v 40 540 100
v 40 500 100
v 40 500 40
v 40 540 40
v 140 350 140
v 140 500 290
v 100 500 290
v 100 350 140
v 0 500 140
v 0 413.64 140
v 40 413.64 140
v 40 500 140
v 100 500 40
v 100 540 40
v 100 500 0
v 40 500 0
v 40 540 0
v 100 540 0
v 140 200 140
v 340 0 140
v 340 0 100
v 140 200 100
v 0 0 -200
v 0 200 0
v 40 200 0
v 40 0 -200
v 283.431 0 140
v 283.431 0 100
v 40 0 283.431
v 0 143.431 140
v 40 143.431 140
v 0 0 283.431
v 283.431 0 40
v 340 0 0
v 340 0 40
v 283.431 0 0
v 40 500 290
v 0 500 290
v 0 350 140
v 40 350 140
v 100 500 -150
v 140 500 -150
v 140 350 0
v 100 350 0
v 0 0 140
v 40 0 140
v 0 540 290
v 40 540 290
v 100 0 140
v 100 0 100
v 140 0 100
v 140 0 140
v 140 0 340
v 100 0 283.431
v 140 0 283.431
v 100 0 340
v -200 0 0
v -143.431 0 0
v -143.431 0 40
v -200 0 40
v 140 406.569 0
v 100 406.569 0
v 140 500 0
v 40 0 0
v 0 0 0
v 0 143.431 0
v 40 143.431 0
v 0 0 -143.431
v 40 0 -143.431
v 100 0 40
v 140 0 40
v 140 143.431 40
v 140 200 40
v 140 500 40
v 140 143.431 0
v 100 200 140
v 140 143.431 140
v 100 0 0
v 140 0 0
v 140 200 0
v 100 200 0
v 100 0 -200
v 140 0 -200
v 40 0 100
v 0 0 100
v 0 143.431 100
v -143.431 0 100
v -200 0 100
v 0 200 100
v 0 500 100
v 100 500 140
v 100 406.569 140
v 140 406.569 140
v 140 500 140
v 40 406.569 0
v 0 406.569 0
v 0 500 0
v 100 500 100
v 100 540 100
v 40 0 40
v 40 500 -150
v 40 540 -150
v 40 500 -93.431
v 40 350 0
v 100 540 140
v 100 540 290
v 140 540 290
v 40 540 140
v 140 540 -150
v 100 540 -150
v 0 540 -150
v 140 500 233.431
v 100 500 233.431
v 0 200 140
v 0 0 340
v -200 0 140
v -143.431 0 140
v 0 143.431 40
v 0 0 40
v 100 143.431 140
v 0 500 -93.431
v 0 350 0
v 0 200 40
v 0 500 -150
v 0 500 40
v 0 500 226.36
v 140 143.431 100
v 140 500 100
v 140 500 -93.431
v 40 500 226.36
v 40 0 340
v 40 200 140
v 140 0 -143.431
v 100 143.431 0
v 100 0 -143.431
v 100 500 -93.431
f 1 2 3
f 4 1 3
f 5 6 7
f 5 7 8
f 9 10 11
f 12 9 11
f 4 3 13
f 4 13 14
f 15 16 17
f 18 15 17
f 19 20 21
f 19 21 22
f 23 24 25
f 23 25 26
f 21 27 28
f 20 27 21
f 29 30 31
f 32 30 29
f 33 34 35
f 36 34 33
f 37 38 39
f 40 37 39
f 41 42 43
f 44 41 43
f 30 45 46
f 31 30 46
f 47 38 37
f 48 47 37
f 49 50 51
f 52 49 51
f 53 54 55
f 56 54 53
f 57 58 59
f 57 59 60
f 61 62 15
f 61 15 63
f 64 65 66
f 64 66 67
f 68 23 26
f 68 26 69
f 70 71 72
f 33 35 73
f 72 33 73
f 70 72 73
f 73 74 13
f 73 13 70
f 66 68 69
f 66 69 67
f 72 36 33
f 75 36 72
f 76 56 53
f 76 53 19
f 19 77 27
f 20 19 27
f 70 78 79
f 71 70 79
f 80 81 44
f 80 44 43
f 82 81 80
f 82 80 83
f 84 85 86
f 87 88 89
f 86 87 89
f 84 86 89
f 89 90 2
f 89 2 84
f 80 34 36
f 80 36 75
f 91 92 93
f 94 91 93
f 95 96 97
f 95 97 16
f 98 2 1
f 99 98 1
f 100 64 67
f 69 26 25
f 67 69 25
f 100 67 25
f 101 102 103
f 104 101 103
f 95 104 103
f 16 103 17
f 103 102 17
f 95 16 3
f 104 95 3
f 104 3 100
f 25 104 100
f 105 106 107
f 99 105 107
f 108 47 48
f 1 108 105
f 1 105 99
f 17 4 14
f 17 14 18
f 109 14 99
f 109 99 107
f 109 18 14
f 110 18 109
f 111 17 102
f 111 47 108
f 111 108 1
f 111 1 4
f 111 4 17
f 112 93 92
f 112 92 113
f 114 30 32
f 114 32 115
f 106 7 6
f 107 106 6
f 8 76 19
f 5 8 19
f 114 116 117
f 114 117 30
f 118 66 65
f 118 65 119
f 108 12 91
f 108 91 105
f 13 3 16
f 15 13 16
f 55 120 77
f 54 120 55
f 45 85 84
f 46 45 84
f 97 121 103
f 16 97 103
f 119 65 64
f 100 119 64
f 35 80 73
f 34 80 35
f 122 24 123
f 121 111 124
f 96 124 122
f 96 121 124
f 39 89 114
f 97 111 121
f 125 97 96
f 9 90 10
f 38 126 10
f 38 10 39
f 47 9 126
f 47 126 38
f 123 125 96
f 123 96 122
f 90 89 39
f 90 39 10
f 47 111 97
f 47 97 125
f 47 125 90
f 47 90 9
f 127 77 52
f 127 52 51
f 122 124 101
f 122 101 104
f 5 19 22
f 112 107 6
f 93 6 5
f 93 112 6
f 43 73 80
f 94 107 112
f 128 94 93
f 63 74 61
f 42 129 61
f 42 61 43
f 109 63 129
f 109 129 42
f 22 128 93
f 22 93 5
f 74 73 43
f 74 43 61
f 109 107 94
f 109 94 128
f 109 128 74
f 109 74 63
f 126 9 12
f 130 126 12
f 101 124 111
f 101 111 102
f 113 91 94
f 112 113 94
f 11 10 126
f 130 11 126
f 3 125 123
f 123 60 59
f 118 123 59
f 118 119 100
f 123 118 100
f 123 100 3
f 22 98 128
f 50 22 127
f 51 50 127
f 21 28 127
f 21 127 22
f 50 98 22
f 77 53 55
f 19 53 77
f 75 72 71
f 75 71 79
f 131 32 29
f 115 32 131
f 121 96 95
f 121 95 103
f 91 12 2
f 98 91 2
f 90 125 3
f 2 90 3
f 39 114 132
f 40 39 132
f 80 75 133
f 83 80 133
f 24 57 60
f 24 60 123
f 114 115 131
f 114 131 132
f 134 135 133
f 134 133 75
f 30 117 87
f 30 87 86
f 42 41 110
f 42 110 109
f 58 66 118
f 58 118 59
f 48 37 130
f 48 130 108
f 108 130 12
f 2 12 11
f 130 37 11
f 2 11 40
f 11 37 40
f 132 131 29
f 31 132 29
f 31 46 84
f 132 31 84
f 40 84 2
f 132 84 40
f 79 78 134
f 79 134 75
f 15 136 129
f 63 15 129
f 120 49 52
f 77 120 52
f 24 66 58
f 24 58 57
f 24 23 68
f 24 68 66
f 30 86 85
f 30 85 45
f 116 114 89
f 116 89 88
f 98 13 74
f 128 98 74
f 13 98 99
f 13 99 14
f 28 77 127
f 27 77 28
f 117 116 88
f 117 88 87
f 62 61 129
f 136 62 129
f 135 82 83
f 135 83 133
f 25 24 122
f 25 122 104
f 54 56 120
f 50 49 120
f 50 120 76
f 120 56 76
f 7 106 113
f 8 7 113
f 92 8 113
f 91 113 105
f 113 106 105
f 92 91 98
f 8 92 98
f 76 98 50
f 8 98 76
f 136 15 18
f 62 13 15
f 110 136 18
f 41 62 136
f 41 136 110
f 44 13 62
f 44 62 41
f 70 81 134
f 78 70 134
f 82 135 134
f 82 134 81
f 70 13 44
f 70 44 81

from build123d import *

# Parameters (mm, degrees)
SKETCH_1_W             = 40
SKETCH_1_H             = 40
EXTRUDE_1_DEPTH        = 500
EXTRUDE_1_2_DEPTH      = 500
EXTRUDE_1_3_DEPTH      = 500
EXTRUDE_1_4_DEPTH      = 500
SKETCH_3_W             = 40
SKETCH_3_H             = 440
EXTRUDE_2_DEPTH        = 40
SKETCH_4_W             = 40
SKETCH_4_H             = 440
EXTRUDE_3_DEPTH        = 40
SKETCH_5_W             = 40
SKETCH_5_H             = 40
EXTRUDE_4_DEPTH        = 100
EXTRUDE_5_DEPTH        = 40
EXTRUDE_6_DEPTH        = 40
EXTRUDE_7_DEPTH        = 40
PATTERN_LINEAR_1_COUNT = 2
PATTERN_LINEAR_1_PITCH = 100
EXTRUDE_8_DEPTH        = 40
EXTRUDE_9_DEPTH        = 40


with BuildPart() as part:
    # 草图1 → 凸台-拉伸1 (new body)
    with BuildSketch(Plane(origin=(0, 0, 0), x_dir=(1, 0, 0), z_dir=(0, 1, 0))):
        with Locations((20, -20)):
            Rectangle(SKETCH_1_W, SKETCH_1_H)
    extrude(amount=EXTRUDE_1_DEPTH)



with BuildPart() as body_2:
    # 草图1 → Extrude 1 2 (new body)
    with BuildSketch(Plane(origin=(0, 0, 0), x_dir=(1, 0, 0), z_dir=(0, 1, 0))):
        with Locations((120, -20)):
            Rectangle(SKETCH_1_W, SKETCH_1_H)
    extrude(amount=EXTRUDE_1_2_DEPTH)



with BuildPart() as body_3:
    # 草图1 → Extrude 1 3 (new body)
    with BuildSketch(Plane(origin=(0, 0, 0), x_dir=(1, 0, 0), z_dir=(0, 1, 0))):
        with Locations((20, -120)):
            Rectangle(SKETCH_1_W, SKETCH_1_H)
    extrude(amount=EXTRUDE_1_3_DEPTH)


with BuildPart() as body_4:
    # 草图1 → Extrude 1 4 (new body)
    with BuildSketch(Plane(origin=(0, 0, 0), x_dir=(1, 0, 0), z_dir=(0, 1, 0))):
        with Locations((120, -120)):
            Rectangle(SKETCH_1_W, SKETCH_1_H)
    extrude(amount=EXTRUDE_1_4_DEPTH)


with BuildPart() as part_1:
    add(part.part)

    add(body_3.part)  # 凸台-拉伸2 merges body 3
    # 草图3 → 凸台-拉伸2 (add)
    with BuildSketch(Plane(origin=(0, 500, 0), x_dir=(1, 0, 0), z_dir=(0, 1, 0))):
        with Locations((20, -70)):
            Rectangle(SKETCH_3_W, SKETCH_3_H)
    extrude(amount=EXTRUDE_2_DEPTH)



with BuildPart() as body_2_1:
    add(body_2.part)

    add(body_4.part)  # 凸台-拉伸3 merges body 4
    # 草图4 → 凸台-拉伸3 (add)
    with BuildSketch(Plane(origin=(0, 500, 0), x_dir=(1, 0, 0), z_dir=(0, 1, 0))):
        with Locations((120, -70)):
            Rectangle(SKETCH_4_W, SKETCH_4_H)
    extrude(amount=EXTRUDE_3_DEPTH)


with BuildPart() as part_2:
    add(part_1.part)

    add(body_2_1.part)  # 凸台-拉伸4 merges body 2
    # 草图5 → 凸台-拉伸4 (add)
    with BuildSketch(Plane(origin=(40, 0, 0), x_dir=(0, 0, -1), z_dir=(1, 0, 0))):
        with Locations((-120, 520)):
            Rectangle(SKETCH_5_W, SKETCH_5_H)
        with Locations((-20, 520)):
            Rectangle(SKETCH_5_W, SKETCH_5_H)
    extrude(amount=EXTRUDE_4_DEPTH)

    # 草图6 → 凸台-拉伸5 (add)
    with BuildSketch(Plane(origin=(140, 0, 0), x_dir=(0, 0, -1), z_dir=(1, 0, 0))):
        Polygon((-290, 500), (-140, 350), (-140, 406.568542495), (-233.431457505, 500), align=None)
        Polygon((150, 500), (0, 350), (0, 406.568542495), (93.431457505, 500), align=None)
    extrude(amount=-EXTRUDE_5_DEPTH)

    # 草图7 → 凸台-拉伸6 (add)
    with BuildSketch(Plane.ZY):
        Polygon((-150, 500), (0, 350), (0, 406.568542495), (-93.431457505, 500), align=None)
        Polygon((290, 500), (140, 350), (140, 413.639610307), (226.360389693, 500), align=None)
    extrude(amount=-EXTRUDE_6_DEPTH)

    # 草图8 → 凸台-拉伸7 (add)
    with BuildSketch(Plane.ZY):
        Polygon((0, 143.431457505), (0, 200), (-200, 0), (-143.431457505, 0), align=None)
        Polygon((140, 143.431457505), (283.431457505, 0), (340, 0), (140, 200), align=None)
    extrude_7 = extrude(amount=-EXTRUDE_7_DEPTH)

    # 阵列(线性)1: 凸台-拉伸7 ×2
    with Locations(*[(i * PATTERN_LINEAR_1_PITCH, 0, 0) for i in range(1, PATTERN_LINEAR_1_COUNT)]):
        add(extrude_7)

    # 草图9 → 凸台-拉伸8 (add)
    with BuildSketch(Plane(origin=(0, 0, 0), x_dir=(-1, 0, 0), z_dir=(0, 0, -1))):
        Polygon((-340, 0), (-283.431457505, 0), (-140, 143.431457505), (-140, 200), align=None)
        Polygon((200, 0), (0, 200), (0, 143.431457505), (143.431457505, 0), align=None)
    extrude(amount=-EXTRUDE_8_DEPTH)

    # 草图10 → 凸台-拉伸9 (add)
    with BuildSketch(Plane.XY.offset(140)):
        Polygon((0, 143.431457505), (0, 200), (-200, 0), (-143.431457505, 0), align=None)
        Polygon((140, 143.431457505), (283.431457505, 0), (340, 0), (140, 200), align=None)
    extrude(amount=-EXTRUDE_9_DEPTH)


solid = part_2.part
